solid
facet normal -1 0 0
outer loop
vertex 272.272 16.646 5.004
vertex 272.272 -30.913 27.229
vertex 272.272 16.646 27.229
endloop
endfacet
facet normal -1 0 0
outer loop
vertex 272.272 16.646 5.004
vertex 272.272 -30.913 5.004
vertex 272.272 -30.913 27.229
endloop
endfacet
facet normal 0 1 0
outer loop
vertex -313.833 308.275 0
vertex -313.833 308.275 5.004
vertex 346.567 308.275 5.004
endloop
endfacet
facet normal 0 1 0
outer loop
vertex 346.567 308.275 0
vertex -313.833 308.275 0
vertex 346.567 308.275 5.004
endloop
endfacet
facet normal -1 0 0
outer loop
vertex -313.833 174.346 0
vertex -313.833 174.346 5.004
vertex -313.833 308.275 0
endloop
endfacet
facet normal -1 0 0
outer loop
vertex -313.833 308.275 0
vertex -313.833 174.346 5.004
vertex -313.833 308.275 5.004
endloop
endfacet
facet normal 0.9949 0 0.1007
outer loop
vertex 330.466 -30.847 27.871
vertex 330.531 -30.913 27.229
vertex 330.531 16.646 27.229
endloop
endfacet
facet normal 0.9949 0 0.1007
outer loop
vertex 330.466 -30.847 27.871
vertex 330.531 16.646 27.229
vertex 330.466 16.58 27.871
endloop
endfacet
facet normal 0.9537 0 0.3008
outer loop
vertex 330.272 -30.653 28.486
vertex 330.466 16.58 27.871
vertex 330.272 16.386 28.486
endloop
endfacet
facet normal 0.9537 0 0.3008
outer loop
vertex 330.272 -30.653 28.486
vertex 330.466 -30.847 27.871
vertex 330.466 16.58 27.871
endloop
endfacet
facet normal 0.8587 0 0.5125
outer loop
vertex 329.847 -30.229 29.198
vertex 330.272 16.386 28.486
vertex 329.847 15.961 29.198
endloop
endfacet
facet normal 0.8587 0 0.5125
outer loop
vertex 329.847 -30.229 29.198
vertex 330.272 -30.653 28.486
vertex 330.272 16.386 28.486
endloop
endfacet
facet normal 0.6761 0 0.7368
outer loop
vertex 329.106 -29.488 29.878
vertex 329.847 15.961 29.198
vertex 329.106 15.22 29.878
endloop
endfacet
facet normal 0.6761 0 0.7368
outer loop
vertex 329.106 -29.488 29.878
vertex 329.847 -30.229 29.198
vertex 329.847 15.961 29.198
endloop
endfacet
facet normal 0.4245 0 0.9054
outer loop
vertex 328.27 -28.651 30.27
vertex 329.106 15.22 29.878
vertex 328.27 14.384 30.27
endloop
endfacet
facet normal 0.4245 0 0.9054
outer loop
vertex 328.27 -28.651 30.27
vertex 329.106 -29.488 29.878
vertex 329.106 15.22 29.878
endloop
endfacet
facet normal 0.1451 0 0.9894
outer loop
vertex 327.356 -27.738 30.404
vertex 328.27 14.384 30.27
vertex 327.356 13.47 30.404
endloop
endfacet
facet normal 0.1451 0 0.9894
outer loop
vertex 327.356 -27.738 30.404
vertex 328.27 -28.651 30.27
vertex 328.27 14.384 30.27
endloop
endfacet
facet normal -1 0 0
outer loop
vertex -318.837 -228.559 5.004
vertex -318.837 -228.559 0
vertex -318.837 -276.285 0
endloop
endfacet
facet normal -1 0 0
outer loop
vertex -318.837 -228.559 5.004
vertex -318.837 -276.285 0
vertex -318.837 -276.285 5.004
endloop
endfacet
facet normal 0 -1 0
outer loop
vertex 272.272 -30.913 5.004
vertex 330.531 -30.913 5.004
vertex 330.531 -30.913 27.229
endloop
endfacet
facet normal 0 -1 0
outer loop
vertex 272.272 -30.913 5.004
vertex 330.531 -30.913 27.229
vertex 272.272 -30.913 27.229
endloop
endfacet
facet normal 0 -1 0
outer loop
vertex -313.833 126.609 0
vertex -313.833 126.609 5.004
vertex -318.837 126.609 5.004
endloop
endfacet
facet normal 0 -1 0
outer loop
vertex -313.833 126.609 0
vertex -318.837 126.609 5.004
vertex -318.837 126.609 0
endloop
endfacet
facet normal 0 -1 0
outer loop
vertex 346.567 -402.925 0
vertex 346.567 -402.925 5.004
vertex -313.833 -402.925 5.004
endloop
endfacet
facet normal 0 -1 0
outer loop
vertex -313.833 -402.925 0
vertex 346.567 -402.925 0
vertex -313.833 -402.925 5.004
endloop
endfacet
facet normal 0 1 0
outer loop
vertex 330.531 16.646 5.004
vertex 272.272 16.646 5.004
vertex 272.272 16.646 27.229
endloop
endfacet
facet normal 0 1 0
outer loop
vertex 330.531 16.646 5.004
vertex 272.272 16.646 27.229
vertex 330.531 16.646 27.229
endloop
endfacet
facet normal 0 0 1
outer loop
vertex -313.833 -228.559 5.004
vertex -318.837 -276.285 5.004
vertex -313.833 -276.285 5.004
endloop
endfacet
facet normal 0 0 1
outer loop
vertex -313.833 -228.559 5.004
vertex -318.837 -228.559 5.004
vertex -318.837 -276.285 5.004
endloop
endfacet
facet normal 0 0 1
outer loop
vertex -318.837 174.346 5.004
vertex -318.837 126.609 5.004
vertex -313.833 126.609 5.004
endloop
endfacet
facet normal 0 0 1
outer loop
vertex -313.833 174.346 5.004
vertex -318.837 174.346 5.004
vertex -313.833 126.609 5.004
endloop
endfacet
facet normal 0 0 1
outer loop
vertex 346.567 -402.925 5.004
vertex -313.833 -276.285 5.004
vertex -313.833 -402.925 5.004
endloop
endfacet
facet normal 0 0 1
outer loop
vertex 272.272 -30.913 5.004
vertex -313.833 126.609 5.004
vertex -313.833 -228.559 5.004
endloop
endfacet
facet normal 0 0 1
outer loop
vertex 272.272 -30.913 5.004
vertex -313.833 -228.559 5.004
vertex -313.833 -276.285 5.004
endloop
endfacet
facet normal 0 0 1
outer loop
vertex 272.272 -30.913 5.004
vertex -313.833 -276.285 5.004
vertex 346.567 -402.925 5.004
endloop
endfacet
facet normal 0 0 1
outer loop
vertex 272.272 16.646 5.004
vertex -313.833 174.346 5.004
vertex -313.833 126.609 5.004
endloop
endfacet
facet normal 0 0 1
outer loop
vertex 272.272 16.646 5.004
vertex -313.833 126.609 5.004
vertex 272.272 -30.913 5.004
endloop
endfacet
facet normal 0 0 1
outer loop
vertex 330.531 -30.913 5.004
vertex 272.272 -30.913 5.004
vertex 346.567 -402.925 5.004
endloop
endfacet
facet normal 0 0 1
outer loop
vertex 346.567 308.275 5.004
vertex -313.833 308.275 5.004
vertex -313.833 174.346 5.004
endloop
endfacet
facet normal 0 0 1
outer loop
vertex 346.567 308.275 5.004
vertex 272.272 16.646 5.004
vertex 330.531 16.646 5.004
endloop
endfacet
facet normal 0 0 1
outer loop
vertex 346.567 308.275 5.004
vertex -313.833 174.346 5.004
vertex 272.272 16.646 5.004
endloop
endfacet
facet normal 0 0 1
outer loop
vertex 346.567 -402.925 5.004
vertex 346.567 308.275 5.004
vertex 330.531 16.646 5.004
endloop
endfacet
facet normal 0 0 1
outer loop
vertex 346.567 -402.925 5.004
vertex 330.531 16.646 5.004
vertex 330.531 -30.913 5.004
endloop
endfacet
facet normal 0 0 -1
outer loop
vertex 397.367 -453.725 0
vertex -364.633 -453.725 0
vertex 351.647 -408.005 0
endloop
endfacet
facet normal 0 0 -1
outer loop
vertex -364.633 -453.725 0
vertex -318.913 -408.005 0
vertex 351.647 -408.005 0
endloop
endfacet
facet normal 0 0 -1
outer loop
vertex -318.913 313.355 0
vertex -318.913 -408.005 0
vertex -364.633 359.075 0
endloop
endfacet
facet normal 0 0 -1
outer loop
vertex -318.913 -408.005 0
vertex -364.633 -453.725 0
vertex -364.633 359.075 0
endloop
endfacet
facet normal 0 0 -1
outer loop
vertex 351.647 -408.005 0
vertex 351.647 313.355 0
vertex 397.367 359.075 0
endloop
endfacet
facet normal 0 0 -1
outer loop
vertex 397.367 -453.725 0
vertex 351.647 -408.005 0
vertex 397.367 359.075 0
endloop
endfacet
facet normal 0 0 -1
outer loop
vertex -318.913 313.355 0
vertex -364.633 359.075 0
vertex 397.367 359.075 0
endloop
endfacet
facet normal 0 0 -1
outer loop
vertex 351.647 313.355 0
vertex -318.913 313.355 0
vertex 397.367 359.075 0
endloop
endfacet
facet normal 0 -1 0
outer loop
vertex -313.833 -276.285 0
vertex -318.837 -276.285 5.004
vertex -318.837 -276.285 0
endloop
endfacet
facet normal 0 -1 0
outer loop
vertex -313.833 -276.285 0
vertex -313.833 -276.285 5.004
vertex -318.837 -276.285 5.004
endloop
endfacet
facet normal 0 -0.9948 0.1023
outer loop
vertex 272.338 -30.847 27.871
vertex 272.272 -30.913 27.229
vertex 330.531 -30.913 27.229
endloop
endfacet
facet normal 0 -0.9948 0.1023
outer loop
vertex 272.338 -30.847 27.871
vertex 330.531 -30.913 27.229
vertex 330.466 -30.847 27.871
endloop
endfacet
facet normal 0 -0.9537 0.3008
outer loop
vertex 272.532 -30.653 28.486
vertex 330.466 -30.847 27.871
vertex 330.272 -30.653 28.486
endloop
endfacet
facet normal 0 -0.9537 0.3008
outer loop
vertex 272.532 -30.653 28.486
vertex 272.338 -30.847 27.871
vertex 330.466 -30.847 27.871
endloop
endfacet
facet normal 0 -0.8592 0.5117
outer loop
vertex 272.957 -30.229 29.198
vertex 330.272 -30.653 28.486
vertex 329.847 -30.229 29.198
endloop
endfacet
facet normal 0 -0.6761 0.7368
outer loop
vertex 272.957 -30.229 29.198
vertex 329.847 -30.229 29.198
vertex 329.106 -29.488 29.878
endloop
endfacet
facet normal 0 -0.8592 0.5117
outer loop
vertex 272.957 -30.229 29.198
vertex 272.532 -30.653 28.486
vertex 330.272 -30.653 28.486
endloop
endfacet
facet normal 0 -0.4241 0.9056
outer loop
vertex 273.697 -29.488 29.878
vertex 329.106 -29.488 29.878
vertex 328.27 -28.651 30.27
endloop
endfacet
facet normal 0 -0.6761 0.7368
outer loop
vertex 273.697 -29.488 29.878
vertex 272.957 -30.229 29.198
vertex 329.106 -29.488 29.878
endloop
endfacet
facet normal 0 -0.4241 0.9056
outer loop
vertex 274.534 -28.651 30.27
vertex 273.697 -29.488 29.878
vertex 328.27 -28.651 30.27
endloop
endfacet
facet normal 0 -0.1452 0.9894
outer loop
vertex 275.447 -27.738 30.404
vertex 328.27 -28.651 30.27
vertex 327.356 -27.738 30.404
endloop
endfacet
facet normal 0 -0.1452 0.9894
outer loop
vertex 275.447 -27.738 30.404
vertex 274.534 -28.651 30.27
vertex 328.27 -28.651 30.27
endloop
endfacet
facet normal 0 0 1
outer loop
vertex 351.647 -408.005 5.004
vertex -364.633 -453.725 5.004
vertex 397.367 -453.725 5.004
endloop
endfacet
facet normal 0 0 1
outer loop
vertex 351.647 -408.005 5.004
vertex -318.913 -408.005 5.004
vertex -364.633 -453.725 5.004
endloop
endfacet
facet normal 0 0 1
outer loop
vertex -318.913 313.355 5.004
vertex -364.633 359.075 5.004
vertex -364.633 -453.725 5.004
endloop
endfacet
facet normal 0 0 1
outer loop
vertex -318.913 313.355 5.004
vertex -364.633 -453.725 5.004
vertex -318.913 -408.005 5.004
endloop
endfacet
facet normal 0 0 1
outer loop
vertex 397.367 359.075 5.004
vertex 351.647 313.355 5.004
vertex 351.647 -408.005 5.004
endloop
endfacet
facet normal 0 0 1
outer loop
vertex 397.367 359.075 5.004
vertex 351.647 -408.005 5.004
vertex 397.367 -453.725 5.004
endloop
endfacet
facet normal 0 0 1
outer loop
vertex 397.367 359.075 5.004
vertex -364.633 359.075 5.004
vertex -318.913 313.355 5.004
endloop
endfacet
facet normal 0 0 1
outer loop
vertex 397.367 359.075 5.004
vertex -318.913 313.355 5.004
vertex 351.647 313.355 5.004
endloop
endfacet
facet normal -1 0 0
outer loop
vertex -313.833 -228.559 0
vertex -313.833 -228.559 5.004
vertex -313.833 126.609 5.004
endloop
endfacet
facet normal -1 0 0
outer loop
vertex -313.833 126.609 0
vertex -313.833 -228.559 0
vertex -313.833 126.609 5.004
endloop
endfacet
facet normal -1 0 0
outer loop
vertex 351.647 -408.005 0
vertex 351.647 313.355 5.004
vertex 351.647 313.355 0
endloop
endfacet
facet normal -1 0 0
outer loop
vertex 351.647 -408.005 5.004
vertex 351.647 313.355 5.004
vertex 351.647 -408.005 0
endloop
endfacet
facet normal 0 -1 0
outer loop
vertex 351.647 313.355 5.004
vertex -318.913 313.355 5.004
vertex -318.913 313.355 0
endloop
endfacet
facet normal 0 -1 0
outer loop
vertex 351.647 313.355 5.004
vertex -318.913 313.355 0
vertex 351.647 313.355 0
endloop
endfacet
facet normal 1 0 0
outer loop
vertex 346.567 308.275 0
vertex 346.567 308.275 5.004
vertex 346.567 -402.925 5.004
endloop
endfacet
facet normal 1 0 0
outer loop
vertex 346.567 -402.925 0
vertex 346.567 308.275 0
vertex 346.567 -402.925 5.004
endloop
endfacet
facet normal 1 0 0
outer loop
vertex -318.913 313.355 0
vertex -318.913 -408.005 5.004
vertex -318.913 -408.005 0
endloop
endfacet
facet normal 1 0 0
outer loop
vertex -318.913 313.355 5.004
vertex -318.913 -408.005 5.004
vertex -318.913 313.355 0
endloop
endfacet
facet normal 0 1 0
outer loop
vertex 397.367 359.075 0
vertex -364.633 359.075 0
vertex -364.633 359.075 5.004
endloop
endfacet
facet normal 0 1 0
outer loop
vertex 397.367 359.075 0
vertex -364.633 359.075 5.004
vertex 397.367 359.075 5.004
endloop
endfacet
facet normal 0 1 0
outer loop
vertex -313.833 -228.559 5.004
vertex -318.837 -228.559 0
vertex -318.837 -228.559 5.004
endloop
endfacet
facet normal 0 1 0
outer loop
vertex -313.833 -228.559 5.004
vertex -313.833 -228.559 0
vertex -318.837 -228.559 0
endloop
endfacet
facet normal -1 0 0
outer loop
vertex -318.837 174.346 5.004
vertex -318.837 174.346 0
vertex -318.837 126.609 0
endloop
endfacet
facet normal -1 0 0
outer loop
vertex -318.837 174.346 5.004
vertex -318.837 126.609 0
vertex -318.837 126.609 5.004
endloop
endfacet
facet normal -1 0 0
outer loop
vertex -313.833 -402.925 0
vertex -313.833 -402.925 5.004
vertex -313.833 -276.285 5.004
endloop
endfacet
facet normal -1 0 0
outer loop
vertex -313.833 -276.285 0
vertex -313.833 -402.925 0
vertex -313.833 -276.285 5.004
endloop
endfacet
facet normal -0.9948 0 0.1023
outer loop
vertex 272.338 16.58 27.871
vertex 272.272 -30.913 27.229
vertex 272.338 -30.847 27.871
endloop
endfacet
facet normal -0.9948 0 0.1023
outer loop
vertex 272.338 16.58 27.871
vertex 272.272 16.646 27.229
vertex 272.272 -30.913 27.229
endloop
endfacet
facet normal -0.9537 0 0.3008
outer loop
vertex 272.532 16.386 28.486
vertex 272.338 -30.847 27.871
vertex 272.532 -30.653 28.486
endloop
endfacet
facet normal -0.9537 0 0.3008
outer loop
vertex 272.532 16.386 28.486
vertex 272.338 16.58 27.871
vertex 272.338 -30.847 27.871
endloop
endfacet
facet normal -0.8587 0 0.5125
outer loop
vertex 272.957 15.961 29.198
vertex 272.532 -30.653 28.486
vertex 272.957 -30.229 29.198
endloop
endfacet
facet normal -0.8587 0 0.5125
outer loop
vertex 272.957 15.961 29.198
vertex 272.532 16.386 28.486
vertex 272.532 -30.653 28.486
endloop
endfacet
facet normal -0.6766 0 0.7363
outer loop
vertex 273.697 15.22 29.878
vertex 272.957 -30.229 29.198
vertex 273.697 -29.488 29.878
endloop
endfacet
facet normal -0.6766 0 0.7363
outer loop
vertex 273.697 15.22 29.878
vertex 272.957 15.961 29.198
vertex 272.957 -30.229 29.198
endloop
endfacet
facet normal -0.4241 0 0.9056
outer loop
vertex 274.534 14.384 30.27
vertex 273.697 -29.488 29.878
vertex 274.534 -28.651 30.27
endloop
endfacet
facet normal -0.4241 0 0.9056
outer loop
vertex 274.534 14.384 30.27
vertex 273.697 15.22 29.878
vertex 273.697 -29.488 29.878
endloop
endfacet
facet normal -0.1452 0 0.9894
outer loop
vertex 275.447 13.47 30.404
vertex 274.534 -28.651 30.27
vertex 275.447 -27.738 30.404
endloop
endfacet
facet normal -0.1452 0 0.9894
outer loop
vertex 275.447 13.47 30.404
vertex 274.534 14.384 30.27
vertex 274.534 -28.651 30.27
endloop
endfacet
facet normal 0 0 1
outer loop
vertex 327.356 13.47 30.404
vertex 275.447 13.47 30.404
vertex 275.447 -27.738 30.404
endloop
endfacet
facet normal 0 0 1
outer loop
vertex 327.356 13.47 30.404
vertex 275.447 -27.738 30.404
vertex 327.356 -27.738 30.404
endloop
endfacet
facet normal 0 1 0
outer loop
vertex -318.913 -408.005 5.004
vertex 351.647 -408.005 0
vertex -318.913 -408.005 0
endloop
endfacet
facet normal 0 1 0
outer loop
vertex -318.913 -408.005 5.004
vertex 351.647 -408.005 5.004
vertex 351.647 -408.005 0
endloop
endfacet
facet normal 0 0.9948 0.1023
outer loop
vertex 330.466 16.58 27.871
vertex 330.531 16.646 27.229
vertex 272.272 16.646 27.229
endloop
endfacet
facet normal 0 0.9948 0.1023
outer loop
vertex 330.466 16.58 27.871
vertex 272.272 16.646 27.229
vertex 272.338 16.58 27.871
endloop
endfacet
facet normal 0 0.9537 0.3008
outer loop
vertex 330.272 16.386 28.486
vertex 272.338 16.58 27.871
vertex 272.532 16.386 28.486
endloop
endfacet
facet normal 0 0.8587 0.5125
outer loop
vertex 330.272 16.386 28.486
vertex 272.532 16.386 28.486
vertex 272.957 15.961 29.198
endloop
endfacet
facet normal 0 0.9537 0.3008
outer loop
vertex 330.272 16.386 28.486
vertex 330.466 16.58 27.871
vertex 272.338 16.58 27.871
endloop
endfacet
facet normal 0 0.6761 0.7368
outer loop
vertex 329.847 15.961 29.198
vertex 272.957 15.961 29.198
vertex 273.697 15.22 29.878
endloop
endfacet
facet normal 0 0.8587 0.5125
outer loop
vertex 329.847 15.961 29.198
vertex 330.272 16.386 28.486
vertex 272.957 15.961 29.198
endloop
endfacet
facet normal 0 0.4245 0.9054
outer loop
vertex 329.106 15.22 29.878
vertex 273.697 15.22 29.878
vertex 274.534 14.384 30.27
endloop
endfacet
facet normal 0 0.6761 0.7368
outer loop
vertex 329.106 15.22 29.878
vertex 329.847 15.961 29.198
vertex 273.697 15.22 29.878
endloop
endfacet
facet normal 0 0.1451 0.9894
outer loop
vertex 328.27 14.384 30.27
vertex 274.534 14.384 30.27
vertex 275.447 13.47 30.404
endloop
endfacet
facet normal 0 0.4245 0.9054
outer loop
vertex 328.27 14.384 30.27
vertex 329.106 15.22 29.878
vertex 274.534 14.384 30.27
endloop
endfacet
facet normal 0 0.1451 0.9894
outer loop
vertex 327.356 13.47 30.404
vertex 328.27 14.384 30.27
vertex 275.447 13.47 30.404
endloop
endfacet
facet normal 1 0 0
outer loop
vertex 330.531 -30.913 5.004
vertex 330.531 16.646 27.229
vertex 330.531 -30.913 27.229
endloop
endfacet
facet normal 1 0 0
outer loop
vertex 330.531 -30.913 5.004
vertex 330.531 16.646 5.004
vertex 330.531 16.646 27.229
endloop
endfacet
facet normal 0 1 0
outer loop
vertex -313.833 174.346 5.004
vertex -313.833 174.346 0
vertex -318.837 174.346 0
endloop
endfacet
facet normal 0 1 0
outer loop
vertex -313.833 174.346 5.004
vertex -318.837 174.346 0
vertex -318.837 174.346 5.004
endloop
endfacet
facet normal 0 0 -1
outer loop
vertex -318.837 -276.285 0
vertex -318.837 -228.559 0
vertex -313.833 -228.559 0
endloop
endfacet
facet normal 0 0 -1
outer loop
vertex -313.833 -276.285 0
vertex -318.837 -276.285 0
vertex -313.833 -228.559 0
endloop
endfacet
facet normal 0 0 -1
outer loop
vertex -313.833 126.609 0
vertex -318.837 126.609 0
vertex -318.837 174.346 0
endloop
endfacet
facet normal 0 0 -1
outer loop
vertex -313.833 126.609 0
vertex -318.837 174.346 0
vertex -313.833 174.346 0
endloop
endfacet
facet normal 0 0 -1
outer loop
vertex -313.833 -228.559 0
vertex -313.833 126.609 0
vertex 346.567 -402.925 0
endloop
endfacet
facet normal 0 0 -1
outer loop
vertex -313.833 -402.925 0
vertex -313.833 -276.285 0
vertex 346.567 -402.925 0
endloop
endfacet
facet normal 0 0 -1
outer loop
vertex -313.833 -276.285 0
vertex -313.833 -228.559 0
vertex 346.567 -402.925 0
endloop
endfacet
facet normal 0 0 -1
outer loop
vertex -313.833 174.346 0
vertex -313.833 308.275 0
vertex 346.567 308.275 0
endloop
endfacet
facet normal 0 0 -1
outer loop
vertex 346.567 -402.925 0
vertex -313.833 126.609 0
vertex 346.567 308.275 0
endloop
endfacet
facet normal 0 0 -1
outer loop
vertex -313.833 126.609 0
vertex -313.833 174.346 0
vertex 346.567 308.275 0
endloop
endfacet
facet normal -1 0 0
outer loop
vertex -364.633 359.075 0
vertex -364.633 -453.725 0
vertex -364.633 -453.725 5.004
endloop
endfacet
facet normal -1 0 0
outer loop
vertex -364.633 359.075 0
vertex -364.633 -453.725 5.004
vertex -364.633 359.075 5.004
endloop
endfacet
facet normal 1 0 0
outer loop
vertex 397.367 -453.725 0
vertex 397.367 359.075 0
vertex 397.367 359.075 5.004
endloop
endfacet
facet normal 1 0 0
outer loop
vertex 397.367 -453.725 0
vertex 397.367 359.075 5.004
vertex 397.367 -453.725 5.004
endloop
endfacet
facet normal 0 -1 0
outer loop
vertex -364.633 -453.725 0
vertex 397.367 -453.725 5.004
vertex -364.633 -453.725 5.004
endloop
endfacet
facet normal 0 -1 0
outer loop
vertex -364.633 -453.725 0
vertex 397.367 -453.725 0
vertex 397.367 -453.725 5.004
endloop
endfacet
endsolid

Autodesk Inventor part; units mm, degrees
ref_plane "YZ Plane" through (0, 0, 0) normal (1, 0, 0) x (0, 1, 0)
ref_plane "XZ Plane" through (0, 0, 0) normal (0, 1, 0) x (-1, 0, 0)
ref_plane "XY Plane" through (0, 0, 0) normal (0, 0, 1) x (1, 0, 0)
sketch "Sketch1" plane through (0, 0, 0) normal (0, 0, 1) x (1, 0, 0)
  line L0 (-364.6328, 359.0746) -> (397.3672, 359.0746)
  line L1 (397.3672, 359.0746) -> (397.3672, -453.7254)
  line L2 (397.3672, -453.7254) -> (-364.6328, -453.7254)
  line L3 (-364.6328, -453.7254) -> (-364.6328, 359.0746)
  point P0 (0, 0)
  dimension "d0" = 762
  dimension "d1" = 812.8
extrude "Extrusion1" add sketch "Sketch1" along normal blind 5.0038
sketch "Sketch2" plane through (0, 0, 5.0038) normal (0, 0, 1) x (1, 0, 0)
  line L0 (-313.8328, 308.2746) -> (346.5672, 308.2746)
  line L1 (346.5672, 308.2746) -> (346.5672, -402.9254)
  line L2 (346.5672, -402.9254) -> (-313.8328, -402.9254)
  line L3 (-313.8328, -402.9254) -> (-313.8328, 308.2746)
  line L4 (-364.6328, 359.0746) -> (397.3672, 359.0746) projected
  line L5 (-364.6328, -453.7254) -> (397.3672, -453.7254) projected
  line L6 (-364.6328, 359.0746) -> (-364.6328, -453.7254) projected
  line L7 (397.3672, -453.7254) -> (397.3672, 359.0746) projected
  line L8 (-318.9128, 313.3546) -> (351.6472, 313.3546)
  line L9 (351.6472, 313.3546) -> (351.6472, -408.0054)
  line L10 (351.6472, -408.0054) -> (-318.9128, -408.0054)
  line L11 (-318.9128, -408.0054) -> (-318.9128, 313.3546)
  point P0 (0, 0)
  dimension "d4" = 50.8
  dimension "d5" = 50.8
  dimension "d6" = 50.8
  dimension "d7" = 50.8
  dimension "d8" = 5.08
  dimension "d9" = 5.08
  dimension "d10" = 5.08
  dimension "d11" = 5.08
extrude "Extrusion2" cut sketch "Sketch2" against normal blind 5.0038 contours L8 L9 L10 L11
sketch "Sketch3" plane through (-313.8328, -402.9254, 5.0038) normal (-1, 0, 0) x (0, 0, 1)
  line L0 (-5.0038, 762) -> (-5.0038, -50.8) projected
  line L1 (0, -50.8) -> (0, 762) projected
  line L2 (-5.0038, 577.2709) -> (0, 577.2709)
  line L3 (0, 577.2709) -> (0, 529.5342)
  line L4 (0, 529.5342) -> (-5.0038, 529.5342)
  line L5 (-5.0038, 529.5342) -> (-5.0038, 577.2709)
  line L6 (0, 174.3668) -> (0, 157.0851)
  line L7 (-5.0038, 157.0851) -> (-5.0038, 174.3668)
  line L8 (0, 0) -> (0, 711.2) projected
  line L9 (-5.0038, 174.3668) -> (0, 174.3668)
  line L10 (0, 174.3668) -> (0, 126.6402)
  line L11 (0, 126.6402) -> (-5.0038, 126.6402)
  line L12 (-5.0038, 126.6402) -> (-5.0038, 174.3668)
  point P0 (-5.0038, 402.9254)
  dimension "d16" = 47.7266
extrude "Extrusion3" add sketch "Sketch3" along normal blind 5.0038 contours L2 L1 L4 L0 | L9 L1 L11 L0
sketch "Sketch4" plane through (0, 0, 5.0038) normal (0, 0, 1) x (1, 0, 0)
  line L0 (272.2721, 16.6455) -> (330.5312, 16.6455)
  line L1 (330.5312, 16.6455) -> (330.5312, -30.913)
  line L2 (330.5312, -30.913) -> (272.2721, -30.913)
  line L3 (272.2721, -30.913) -> (272.2721, 16.6455)
  point P0 (0, 0)
extrude "Extrusion4" add sketch "Sketch4" along normal blind 25.4
fillet "Fillet1" radius 3.175 4 edges at (301.4017, 16.6455, 30.4038) (330.5312, -7.1338, 30.4038) (301.4017, -30.913, 30.4038) (272.2721, -7.1338, 30.4038)
properties part number "tetris backdoor"
